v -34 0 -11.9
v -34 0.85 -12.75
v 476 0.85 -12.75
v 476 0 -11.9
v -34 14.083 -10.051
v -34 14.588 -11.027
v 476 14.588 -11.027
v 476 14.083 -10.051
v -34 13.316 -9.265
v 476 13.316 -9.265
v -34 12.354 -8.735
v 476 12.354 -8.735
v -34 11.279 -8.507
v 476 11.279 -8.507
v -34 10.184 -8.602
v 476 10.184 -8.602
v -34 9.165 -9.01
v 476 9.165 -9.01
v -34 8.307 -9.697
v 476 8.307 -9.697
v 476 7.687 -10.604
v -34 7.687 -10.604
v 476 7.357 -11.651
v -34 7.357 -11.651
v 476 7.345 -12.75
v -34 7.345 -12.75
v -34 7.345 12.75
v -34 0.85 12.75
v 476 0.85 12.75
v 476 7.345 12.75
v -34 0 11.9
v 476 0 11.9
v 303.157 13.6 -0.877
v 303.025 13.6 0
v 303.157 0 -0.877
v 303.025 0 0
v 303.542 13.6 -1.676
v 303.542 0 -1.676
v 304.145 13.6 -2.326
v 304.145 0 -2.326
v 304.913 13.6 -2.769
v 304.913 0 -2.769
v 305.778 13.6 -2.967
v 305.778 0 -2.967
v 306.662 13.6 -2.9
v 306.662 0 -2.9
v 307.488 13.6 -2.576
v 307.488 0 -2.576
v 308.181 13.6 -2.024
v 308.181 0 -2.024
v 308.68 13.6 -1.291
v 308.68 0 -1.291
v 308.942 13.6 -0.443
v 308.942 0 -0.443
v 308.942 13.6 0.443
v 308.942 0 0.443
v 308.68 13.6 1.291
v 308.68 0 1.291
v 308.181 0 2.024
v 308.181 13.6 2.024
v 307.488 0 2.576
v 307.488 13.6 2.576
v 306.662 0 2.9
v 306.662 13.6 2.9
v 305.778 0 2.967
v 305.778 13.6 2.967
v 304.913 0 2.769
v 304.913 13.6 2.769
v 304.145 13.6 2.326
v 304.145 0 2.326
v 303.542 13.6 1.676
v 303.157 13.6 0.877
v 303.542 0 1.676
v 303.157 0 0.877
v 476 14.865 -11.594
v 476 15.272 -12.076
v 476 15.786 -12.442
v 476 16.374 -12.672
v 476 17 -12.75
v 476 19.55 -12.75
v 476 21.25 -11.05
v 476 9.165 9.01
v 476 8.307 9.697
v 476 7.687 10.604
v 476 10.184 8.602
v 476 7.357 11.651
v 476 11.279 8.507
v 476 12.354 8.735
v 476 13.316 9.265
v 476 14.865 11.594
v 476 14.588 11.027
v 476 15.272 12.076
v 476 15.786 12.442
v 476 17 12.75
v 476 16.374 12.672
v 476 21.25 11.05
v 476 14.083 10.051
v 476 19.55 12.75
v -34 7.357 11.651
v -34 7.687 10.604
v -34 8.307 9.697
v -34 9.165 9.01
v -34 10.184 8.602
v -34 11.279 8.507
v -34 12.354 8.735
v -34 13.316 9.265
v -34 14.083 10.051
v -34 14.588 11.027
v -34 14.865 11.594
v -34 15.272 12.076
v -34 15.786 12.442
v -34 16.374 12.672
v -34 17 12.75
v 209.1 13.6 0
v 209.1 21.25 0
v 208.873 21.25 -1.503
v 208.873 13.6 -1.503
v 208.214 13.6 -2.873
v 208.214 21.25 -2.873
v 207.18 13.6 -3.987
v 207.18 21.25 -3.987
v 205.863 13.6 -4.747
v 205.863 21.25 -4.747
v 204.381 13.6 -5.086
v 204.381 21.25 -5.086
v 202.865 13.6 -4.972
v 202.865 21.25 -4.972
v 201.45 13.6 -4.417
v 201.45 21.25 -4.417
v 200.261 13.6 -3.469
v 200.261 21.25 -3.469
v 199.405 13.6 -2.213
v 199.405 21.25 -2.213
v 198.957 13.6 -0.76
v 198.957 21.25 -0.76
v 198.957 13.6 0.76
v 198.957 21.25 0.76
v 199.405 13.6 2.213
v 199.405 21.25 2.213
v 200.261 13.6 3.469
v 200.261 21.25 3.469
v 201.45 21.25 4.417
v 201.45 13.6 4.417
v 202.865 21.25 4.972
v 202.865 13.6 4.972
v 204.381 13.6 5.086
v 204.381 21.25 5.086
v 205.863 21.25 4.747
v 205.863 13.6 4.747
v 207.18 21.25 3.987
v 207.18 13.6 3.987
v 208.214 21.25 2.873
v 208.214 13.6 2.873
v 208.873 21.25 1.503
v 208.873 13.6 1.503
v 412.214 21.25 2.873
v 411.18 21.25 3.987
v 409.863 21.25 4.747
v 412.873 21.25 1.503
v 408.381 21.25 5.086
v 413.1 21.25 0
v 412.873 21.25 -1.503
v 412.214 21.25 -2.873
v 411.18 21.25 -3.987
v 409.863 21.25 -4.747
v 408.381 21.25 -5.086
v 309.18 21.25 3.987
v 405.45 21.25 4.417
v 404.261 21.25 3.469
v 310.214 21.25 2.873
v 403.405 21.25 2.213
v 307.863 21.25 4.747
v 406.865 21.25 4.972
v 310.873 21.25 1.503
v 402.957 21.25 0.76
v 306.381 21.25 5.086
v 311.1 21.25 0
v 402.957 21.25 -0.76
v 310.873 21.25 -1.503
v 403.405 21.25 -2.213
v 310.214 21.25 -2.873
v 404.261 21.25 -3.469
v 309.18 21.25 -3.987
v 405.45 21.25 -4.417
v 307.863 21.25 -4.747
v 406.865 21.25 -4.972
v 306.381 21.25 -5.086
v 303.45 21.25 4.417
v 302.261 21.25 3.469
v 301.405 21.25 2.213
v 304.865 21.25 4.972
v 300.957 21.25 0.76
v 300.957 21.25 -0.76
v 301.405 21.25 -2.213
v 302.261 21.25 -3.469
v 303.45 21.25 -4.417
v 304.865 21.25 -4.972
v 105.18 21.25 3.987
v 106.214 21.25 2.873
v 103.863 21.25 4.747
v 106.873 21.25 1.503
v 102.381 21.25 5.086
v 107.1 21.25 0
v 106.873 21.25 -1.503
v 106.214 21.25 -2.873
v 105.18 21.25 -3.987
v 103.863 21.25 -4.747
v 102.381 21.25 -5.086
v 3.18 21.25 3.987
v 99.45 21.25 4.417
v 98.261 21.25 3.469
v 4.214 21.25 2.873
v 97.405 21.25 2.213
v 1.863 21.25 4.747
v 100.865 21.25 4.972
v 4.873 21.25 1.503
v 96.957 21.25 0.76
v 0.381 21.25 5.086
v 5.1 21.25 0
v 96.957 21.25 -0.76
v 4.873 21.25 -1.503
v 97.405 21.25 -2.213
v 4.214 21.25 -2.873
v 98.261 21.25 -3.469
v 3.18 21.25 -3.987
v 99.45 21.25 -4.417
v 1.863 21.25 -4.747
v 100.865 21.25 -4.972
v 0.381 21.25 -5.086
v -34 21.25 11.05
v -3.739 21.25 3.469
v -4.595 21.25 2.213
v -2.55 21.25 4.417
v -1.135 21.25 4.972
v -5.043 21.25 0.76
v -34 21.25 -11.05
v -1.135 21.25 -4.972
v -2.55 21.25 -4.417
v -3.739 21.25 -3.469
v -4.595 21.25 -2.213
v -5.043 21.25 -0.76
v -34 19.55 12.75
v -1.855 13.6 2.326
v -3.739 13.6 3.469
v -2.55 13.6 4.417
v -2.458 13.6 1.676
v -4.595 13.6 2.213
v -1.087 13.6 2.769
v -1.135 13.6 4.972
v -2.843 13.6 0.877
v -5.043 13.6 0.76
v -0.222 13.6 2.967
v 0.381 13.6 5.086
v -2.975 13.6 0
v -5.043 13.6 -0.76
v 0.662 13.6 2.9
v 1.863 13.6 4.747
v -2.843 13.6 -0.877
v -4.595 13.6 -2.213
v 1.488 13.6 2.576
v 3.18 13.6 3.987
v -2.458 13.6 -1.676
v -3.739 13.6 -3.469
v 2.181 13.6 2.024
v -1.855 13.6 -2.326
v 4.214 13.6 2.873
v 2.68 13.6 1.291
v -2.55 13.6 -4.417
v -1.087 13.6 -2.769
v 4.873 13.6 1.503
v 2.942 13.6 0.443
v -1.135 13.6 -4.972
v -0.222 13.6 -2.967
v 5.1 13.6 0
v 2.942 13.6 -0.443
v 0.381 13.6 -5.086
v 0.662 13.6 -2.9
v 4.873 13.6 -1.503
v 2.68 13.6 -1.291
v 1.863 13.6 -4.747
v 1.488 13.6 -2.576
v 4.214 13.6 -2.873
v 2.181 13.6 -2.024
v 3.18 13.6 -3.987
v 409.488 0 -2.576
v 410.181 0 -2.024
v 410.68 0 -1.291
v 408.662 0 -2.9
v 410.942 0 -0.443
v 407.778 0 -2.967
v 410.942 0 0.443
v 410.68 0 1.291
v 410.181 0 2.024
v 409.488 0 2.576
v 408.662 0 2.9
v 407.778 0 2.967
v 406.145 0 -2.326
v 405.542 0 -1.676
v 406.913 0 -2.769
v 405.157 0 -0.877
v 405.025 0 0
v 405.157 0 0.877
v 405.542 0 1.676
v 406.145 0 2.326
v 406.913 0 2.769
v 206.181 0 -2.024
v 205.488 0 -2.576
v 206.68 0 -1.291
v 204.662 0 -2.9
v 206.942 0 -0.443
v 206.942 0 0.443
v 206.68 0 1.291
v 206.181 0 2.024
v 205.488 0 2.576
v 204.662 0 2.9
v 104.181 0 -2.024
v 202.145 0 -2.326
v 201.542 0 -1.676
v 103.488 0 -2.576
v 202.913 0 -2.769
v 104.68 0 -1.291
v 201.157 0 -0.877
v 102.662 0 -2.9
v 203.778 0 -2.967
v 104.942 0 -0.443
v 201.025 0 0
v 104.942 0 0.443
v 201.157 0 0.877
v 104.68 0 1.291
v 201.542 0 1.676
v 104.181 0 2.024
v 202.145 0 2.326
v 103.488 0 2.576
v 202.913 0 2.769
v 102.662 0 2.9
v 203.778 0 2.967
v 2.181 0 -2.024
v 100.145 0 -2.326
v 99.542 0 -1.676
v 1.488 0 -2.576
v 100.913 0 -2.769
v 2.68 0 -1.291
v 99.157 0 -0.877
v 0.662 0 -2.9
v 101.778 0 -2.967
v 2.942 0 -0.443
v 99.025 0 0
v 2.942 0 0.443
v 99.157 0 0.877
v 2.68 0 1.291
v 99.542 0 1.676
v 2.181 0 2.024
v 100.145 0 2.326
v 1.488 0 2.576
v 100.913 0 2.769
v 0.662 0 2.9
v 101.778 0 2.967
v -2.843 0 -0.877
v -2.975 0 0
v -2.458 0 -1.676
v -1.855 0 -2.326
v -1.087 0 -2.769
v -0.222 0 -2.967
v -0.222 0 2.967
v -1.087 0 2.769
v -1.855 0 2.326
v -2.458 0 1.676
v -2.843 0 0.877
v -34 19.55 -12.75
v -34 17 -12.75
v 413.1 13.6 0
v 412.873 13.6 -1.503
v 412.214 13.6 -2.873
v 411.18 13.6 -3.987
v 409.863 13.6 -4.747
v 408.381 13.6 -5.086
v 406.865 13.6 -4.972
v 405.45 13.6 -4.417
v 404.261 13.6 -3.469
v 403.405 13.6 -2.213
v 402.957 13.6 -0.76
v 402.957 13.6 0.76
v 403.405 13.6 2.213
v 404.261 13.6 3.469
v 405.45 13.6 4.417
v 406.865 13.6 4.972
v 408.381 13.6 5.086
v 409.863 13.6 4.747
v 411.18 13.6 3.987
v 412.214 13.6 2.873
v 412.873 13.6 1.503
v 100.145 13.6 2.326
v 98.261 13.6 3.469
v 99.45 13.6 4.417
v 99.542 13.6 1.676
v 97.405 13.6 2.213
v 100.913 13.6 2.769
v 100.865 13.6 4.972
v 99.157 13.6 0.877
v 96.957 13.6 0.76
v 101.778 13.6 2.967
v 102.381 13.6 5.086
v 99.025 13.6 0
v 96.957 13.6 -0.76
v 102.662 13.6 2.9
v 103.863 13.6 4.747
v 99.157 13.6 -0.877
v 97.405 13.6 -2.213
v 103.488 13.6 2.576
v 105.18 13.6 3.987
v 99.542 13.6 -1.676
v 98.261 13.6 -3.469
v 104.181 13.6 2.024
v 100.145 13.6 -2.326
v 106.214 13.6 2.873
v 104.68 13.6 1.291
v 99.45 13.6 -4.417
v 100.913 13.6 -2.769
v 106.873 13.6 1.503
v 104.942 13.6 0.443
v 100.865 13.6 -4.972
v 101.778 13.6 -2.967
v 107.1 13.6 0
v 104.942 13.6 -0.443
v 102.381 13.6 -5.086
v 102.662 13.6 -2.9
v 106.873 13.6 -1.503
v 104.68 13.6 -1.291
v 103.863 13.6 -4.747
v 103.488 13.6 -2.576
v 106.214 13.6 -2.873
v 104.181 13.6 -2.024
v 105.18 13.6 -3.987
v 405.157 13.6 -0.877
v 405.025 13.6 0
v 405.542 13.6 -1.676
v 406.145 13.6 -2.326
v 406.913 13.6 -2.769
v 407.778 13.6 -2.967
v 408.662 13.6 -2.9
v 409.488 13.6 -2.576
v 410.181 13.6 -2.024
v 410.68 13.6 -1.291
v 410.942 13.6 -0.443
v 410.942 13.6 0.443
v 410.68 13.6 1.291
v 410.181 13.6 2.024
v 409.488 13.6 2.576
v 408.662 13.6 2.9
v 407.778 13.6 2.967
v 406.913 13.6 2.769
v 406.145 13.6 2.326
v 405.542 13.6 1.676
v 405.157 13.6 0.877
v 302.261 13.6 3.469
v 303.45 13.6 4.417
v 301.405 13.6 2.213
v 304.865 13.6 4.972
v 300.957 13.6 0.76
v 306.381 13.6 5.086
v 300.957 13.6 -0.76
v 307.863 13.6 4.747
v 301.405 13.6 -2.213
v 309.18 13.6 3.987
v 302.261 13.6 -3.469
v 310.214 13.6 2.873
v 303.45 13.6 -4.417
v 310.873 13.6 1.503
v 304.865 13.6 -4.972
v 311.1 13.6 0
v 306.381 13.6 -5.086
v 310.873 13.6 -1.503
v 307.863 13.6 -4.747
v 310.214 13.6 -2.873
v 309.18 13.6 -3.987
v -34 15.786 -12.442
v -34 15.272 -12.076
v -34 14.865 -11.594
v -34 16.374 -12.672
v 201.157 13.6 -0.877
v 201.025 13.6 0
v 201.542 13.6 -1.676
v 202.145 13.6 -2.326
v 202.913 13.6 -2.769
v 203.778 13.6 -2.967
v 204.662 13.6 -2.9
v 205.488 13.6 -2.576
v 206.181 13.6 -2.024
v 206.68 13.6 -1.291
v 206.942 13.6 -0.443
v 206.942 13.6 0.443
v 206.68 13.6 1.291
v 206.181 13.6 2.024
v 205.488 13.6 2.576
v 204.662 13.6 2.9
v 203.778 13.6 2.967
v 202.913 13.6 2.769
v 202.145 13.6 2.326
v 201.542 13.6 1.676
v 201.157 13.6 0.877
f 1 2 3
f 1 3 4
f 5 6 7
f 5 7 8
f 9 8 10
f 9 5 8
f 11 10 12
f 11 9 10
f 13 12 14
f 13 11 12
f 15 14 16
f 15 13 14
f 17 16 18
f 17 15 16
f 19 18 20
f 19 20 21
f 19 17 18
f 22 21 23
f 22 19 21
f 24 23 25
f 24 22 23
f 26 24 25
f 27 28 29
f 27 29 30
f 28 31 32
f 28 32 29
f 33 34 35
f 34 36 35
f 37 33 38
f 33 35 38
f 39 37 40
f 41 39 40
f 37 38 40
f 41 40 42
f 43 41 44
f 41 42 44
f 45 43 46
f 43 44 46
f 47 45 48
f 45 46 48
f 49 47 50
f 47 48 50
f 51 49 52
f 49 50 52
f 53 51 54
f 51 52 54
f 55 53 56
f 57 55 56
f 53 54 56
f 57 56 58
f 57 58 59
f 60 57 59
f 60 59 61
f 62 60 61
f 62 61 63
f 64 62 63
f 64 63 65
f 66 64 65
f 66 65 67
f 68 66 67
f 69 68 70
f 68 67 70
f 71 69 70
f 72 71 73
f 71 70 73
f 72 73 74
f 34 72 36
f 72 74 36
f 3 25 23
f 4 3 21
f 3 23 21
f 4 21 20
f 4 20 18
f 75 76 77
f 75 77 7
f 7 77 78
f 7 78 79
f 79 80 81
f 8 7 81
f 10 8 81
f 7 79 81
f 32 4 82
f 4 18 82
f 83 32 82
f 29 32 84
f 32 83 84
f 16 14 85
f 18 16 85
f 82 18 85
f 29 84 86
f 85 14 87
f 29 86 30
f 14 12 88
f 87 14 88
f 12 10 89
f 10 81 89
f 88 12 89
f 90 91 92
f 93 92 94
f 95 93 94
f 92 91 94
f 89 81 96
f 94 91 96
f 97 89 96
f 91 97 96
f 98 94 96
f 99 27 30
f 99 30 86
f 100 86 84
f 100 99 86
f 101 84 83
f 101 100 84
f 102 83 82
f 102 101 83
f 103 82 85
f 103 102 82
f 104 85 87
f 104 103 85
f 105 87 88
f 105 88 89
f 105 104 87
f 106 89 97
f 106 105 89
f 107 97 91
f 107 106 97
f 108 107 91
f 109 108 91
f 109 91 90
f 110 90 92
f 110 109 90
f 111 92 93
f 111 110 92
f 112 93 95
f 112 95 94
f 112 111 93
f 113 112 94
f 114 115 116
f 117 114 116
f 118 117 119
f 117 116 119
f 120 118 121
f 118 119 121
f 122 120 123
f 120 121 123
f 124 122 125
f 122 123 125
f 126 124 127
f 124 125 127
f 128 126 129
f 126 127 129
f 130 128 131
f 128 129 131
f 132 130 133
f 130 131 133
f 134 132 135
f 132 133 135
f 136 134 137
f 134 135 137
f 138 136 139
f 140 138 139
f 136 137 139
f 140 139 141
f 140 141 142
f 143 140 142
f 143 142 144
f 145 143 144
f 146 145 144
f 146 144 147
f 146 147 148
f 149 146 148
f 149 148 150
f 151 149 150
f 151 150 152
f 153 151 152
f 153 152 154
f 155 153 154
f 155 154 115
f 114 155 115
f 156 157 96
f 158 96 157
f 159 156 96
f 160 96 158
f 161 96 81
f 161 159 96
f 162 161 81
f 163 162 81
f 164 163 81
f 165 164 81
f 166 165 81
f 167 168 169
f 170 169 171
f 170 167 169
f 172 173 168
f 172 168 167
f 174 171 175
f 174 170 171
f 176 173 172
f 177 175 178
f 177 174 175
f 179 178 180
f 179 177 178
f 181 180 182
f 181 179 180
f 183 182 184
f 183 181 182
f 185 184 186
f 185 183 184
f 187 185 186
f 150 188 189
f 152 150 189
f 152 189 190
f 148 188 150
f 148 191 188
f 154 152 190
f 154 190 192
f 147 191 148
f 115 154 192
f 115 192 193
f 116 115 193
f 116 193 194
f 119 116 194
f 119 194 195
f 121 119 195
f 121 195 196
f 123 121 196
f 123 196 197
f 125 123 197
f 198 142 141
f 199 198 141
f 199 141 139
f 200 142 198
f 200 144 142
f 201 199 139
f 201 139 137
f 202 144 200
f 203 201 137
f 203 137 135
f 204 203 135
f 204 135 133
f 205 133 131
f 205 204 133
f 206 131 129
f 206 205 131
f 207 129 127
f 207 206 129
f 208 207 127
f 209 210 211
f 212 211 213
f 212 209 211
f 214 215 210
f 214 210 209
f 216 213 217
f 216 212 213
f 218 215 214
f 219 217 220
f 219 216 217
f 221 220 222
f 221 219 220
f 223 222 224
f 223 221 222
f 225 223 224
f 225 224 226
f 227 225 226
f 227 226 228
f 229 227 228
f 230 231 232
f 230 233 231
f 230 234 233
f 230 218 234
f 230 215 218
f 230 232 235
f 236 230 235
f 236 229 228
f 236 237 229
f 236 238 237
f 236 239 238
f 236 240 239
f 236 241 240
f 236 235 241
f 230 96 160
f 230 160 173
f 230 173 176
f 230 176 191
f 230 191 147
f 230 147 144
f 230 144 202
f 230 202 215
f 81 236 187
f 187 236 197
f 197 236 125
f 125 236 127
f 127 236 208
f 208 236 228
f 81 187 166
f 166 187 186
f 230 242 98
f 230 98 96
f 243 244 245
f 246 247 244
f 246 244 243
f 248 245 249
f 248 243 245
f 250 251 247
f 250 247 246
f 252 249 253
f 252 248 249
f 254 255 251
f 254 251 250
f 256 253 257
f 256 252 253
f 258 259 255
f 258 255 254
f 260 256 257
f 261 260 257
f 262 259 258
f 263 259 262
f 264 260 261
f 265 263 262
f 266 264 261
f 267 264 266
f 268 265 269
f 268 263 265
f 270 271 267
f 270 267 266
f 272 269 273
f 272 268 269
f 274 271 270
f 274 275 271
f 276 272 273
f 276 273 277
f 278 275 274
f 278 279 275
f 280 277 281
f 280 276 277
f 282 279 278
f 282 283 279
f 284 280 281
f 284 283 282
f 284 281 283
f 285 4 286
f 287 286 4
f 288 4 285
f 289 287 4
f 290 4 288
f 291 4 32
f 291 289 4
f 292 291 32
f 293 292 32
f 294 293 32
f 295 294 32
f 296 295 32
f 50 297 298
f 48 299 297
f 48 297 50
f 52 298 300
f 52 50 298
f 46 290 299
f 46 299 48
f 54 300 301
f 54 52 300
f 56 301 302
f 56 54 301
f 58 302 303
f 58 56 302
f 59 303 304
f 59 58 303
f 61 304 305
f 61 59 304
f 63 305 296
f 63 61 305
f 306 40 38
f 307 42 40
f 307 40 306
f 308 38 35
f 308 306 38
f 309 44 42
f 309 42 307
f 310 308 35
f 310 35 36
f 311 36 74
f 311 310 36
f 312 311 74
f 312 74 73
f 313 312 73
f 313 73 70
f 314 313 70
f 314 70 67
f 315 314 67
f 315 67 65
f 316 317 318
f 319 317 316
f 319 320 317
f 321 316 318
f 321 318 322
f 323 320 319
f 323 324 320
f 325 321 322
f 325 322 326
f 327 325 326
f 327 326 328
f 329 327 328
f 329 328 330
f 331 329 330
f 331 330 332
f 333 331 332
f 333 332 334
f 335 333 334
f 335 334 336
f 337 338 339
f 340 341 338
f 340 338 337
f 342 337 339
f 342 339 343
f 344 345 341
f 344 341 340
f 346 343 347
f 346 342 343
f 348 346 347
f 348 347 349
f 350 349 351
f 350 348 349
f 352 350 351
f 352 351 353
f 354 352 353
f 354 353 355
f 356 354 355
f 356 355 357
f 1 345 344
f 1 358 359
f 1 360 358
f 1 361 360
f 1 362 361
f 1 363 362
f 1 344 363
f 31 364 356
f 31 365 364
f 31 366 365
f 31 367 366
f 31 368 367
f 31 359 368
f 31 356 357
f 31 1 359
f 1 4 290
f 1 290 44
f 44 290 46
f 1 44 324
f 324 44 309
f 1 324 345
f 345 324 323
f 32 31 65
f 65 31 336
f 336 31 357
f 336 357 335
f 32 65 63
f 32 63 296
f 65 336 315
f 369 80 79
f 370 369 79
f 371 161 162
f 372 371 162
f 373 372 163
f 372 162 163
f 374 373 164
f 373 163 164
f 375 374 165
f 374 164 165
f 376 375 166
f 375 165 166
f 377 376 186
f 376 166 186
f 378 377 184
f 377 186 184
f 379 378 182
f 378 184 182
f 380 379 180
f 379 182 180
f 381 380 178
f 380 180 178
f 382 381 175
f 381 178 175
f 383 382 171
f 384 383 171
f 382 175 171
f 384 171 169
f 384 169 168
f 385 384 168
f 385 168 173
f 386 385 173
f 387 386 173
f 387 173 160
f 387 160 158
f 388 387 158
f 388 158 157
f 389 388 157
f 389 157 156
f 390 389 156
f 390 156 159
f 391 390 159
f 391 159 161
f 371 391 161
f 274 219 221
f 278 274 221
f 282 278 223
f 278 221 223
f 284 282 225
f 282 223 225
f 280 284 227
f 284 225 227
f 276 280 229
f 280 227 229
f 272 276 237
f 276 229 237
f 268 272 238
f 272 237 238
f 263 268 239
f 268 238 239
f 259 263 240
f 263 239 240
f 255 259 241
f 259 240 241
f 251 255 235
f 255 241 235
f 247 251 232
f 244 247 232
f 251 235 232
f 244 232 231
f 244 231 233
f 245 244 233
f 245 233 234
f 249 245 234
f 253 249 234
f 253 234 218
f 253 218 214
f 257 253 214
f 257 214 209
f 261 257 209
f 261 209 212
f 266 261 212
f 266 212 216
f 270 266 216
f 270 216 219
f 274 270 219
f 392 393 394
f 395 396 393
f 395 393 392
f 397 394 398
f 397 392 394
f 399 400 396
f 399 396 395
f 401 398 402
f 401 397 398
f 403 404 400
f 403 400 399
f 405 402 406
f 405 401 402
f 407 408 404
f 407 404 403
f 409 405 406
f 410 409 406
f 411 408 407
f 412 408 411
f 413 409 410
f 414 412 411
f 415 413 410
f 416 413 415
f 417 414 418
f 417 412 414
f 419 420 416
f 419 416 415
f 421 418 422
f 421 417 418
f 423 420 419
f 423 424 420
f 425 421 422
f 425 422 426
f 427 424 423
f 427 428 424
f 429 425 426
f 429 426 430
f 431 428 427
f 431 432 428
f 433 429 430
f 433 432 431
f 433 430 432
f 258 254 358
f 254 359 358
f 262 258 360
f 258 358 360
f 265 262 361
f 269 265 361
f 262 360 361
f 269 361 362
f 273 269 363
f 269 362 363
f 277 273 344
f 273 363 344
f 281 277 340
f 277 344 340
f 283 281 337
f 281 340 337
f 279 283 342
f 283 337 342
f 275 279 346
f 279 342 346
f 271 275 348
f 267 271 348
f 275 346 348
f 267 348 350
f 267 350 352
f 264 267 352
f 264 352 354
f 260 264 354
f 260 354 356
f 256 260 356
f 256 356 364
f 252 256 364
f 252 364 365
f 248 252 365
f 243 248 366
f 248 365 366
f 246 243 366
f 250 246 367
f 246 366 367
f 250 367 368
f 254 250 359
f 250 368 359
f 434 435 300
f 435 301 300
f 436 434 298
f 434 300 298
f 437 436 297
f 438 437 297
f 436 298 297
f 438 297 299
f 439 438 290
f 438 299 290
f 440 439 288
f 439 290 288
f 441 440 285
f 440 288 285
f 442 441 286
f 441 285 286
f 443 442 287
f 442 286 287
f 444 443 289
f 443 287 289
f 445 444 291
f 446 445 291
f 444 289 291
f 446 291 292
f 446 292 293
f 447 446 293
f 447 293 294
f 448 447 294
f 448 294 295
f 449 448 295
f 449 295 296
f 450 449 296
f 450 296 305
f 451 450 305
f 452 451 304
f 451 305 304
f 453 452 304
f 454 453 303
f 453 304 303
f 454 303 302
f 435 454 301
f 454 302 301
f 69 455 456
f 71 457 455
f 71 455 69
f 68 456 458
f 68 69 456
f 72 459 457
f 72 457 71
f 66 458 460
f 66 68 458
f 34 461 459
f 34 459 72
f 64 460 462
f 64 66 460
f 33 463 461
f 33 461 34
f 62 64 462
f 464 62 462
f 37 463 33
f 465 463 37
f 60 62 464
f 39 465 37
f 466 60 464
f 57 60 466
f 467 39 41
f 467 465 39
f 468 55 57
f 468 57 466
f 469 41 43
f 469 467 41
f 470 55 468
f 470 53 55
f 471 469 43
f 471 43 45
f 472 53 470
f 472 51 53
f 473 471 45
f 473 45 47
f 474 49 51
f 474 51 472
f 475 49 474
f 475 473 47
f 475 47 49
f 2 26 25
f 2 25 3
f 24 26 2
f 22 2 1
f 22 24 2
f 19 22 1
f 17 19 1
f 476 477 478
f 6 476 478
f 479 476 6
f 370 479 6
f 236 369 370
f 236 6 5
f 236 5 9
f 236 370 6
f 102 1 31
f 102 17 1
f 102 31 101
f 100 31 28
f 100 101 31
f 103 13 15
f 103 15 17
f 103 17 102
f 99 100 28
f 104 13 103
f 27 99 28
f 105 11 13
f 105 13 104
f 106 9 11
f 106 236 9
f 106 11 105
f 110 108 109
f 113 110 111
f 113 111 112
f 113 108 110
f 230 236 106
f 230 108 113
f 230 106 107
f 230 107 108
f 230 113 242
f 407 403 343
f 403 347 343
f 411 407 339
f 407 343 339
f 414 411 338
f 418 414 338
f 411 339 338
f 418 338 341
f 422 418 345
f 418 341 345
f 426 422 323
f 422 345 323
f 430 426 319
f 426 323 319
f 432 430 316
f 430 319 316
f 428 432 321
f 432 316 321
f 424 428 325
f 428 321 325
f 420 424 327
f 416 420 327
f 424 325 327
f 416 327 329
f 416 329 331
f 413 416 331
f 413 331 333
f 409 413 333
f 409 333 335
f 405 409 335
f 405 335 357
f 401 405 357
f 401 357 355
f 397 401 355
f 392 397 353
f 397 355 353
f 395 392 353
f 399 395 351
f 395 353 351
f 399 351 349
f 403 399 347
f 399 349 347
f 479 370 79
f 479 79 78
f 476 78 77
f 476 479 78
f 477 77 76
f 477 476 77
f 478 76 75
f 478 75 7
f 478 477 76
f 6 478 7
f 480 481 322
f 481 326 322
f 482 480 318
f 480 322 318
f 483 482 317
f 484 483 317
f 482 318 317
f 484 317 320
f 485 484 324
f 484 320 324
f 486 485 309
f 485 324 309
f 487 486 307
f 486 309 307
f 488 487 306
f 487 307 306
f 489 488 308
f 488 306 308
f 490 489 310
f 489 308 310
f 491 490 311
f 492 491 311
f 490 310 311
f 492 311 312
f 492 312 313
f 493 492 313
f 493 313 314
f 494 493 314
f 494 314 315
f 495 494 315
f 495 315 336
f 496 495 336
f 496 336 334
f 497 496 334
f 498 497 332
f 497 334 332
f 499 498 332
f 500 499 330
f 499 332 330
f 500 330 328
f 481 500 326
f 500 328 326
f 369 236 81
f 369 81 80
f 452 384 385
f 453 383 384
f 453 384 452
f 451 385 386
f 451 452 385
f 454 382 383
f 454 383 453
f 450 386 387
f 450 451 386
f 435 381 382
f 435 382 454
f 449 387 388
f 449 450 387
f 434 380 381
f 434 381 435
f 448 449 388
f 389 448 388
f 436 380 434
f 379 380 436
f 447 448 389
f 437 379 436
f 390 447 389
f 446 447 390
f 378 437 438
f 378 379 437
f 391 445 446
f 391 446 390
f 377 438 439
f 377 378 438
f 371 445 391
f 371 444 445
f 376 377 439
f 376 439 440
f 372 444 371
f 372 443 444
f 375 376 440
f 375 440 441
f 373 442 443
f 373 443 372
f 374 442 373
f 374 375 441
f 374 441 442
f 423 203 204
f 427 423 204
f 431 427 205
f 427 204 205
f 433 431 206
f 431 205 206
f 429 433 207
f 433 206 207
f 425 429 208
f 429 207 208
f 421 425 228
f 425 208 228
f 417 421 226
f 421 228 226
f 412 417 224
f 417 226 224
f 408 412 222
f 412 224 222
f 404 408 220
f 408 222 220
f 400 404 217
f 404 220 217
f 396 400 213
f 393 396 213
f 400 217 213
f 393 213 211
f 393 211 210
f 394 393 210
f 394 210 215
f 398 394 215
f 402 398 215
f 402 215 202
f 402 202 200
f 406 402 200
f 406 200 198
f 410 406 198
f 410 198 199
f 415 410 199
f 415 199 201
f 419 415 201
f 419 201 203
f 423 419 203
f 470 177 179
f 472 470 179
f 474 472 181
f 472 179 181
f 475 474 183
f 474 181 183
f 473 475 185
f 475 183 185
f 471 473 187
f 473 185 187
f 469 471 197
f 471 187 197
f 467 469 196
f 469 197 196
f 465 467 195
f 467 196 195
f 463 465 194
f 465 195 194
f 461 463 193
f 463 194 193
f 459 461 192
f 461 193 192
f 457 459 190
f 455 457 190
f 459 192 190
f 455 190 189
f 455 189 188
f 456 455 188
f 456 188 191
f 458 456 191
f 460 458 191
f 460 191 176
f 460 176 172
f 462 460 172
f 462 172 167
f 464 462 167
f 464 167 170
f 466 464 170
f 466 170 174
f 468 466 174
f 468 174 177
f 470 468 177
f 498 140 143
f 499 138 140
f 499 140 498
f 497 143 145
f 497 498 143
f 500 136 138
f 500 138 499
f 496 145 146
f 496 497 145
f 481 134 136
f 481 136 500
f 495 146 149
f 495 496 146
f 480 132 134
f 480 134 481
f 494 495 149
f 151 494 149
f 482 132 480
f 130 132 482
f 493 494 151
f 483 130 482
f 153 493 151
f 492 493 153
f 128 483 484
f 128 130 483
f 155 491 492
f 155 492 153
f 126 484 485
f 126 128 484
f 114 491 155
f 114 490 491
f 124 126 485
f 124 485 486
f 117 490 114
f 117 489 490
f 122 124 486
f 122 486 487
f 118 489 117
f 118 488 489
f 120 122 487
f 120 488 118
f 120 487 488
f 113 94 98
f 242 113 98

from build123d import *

# Parameters (mm, degrees)
BOSS_EXTRUDE1_DEPTH    = 300
CAP_SCREW1_D           = 3.5
CAP_SCREW1_CBORE_D     = 6
CAP_SCREW1_CBORE_DEPTH = 4.5
SCALE_2_SCALE          = 1.7


with BuildPart() as part:
    # Sketch1 → Boss-Extrude1 (new body)
    with BuildSketch(Plane(origin=(-20, 0, 0), x_dir=(0, 0, -1), z_dir=(1, 0, 0))):
        with BuildLine():
            Line((6.5, 12.5), (7.5, 11.5))
            Line((7.5, 11.5), (7.5, 10))
            ThreePointArc((7.5, 10), (7.220600207, 9.128142709), (6.486486486, 8.581081081))
            ThreePointArc((6.486486486, 8.581081081), (5.059724666, 5.990862007), (7.5, 4.320550528))
            Line((7.5, 4.320550528), (7.5, 0.5))
            Line((7.5, 0.5), (7, 0))
            Line((7, 0), (-7, 0))
            Line((-7, 0), (-7.5, 0.5))
            Line((-7.5, 0.5), (-7.5, 4.320550528))
            ThreePointArc((-7.5, 4.320550528), (-5.059724666, 5.990862007), (-6.486486486, 8.581081081))
            ThreePointArc((-6.486486486, 8.581081081), (-7.220600207, 9.128142709), (-7.5, 10))
            Line((-7.5, 10), (-7.5, 11.5))
            Line((-7.5, 11.5), (-6.5, 12.5))
            Line((-6.5, 12.5), (6.5, 12.5))
        make_face()
    extrude(amount=BOSS_EXTRUDE1_DEPTH)

    # Cap Screw1 (through all)
    with Locations(Plane(origin=(0, 12.5, 0), x_dir=(1, 0, 0), z_dir=(0, 1, 0))):
        with Locations((0, 0), (60, 0), (120, 0), (180, 0), (240, 0), (300, 0), (360, 0), (420, 0)):
            CounterBoreHole(CAP_SCREW1_D / 2, CAP_SCREW1_CBORE_D / 2, CAP_SCREW1_CBORE_DEPTH)


with BuildPart() as part_1:
    # 缩放比例2: scaled about (0, 0, 0)
    add(part.part.scale(SCALE_2_SCALE))


solid = part_1.part
